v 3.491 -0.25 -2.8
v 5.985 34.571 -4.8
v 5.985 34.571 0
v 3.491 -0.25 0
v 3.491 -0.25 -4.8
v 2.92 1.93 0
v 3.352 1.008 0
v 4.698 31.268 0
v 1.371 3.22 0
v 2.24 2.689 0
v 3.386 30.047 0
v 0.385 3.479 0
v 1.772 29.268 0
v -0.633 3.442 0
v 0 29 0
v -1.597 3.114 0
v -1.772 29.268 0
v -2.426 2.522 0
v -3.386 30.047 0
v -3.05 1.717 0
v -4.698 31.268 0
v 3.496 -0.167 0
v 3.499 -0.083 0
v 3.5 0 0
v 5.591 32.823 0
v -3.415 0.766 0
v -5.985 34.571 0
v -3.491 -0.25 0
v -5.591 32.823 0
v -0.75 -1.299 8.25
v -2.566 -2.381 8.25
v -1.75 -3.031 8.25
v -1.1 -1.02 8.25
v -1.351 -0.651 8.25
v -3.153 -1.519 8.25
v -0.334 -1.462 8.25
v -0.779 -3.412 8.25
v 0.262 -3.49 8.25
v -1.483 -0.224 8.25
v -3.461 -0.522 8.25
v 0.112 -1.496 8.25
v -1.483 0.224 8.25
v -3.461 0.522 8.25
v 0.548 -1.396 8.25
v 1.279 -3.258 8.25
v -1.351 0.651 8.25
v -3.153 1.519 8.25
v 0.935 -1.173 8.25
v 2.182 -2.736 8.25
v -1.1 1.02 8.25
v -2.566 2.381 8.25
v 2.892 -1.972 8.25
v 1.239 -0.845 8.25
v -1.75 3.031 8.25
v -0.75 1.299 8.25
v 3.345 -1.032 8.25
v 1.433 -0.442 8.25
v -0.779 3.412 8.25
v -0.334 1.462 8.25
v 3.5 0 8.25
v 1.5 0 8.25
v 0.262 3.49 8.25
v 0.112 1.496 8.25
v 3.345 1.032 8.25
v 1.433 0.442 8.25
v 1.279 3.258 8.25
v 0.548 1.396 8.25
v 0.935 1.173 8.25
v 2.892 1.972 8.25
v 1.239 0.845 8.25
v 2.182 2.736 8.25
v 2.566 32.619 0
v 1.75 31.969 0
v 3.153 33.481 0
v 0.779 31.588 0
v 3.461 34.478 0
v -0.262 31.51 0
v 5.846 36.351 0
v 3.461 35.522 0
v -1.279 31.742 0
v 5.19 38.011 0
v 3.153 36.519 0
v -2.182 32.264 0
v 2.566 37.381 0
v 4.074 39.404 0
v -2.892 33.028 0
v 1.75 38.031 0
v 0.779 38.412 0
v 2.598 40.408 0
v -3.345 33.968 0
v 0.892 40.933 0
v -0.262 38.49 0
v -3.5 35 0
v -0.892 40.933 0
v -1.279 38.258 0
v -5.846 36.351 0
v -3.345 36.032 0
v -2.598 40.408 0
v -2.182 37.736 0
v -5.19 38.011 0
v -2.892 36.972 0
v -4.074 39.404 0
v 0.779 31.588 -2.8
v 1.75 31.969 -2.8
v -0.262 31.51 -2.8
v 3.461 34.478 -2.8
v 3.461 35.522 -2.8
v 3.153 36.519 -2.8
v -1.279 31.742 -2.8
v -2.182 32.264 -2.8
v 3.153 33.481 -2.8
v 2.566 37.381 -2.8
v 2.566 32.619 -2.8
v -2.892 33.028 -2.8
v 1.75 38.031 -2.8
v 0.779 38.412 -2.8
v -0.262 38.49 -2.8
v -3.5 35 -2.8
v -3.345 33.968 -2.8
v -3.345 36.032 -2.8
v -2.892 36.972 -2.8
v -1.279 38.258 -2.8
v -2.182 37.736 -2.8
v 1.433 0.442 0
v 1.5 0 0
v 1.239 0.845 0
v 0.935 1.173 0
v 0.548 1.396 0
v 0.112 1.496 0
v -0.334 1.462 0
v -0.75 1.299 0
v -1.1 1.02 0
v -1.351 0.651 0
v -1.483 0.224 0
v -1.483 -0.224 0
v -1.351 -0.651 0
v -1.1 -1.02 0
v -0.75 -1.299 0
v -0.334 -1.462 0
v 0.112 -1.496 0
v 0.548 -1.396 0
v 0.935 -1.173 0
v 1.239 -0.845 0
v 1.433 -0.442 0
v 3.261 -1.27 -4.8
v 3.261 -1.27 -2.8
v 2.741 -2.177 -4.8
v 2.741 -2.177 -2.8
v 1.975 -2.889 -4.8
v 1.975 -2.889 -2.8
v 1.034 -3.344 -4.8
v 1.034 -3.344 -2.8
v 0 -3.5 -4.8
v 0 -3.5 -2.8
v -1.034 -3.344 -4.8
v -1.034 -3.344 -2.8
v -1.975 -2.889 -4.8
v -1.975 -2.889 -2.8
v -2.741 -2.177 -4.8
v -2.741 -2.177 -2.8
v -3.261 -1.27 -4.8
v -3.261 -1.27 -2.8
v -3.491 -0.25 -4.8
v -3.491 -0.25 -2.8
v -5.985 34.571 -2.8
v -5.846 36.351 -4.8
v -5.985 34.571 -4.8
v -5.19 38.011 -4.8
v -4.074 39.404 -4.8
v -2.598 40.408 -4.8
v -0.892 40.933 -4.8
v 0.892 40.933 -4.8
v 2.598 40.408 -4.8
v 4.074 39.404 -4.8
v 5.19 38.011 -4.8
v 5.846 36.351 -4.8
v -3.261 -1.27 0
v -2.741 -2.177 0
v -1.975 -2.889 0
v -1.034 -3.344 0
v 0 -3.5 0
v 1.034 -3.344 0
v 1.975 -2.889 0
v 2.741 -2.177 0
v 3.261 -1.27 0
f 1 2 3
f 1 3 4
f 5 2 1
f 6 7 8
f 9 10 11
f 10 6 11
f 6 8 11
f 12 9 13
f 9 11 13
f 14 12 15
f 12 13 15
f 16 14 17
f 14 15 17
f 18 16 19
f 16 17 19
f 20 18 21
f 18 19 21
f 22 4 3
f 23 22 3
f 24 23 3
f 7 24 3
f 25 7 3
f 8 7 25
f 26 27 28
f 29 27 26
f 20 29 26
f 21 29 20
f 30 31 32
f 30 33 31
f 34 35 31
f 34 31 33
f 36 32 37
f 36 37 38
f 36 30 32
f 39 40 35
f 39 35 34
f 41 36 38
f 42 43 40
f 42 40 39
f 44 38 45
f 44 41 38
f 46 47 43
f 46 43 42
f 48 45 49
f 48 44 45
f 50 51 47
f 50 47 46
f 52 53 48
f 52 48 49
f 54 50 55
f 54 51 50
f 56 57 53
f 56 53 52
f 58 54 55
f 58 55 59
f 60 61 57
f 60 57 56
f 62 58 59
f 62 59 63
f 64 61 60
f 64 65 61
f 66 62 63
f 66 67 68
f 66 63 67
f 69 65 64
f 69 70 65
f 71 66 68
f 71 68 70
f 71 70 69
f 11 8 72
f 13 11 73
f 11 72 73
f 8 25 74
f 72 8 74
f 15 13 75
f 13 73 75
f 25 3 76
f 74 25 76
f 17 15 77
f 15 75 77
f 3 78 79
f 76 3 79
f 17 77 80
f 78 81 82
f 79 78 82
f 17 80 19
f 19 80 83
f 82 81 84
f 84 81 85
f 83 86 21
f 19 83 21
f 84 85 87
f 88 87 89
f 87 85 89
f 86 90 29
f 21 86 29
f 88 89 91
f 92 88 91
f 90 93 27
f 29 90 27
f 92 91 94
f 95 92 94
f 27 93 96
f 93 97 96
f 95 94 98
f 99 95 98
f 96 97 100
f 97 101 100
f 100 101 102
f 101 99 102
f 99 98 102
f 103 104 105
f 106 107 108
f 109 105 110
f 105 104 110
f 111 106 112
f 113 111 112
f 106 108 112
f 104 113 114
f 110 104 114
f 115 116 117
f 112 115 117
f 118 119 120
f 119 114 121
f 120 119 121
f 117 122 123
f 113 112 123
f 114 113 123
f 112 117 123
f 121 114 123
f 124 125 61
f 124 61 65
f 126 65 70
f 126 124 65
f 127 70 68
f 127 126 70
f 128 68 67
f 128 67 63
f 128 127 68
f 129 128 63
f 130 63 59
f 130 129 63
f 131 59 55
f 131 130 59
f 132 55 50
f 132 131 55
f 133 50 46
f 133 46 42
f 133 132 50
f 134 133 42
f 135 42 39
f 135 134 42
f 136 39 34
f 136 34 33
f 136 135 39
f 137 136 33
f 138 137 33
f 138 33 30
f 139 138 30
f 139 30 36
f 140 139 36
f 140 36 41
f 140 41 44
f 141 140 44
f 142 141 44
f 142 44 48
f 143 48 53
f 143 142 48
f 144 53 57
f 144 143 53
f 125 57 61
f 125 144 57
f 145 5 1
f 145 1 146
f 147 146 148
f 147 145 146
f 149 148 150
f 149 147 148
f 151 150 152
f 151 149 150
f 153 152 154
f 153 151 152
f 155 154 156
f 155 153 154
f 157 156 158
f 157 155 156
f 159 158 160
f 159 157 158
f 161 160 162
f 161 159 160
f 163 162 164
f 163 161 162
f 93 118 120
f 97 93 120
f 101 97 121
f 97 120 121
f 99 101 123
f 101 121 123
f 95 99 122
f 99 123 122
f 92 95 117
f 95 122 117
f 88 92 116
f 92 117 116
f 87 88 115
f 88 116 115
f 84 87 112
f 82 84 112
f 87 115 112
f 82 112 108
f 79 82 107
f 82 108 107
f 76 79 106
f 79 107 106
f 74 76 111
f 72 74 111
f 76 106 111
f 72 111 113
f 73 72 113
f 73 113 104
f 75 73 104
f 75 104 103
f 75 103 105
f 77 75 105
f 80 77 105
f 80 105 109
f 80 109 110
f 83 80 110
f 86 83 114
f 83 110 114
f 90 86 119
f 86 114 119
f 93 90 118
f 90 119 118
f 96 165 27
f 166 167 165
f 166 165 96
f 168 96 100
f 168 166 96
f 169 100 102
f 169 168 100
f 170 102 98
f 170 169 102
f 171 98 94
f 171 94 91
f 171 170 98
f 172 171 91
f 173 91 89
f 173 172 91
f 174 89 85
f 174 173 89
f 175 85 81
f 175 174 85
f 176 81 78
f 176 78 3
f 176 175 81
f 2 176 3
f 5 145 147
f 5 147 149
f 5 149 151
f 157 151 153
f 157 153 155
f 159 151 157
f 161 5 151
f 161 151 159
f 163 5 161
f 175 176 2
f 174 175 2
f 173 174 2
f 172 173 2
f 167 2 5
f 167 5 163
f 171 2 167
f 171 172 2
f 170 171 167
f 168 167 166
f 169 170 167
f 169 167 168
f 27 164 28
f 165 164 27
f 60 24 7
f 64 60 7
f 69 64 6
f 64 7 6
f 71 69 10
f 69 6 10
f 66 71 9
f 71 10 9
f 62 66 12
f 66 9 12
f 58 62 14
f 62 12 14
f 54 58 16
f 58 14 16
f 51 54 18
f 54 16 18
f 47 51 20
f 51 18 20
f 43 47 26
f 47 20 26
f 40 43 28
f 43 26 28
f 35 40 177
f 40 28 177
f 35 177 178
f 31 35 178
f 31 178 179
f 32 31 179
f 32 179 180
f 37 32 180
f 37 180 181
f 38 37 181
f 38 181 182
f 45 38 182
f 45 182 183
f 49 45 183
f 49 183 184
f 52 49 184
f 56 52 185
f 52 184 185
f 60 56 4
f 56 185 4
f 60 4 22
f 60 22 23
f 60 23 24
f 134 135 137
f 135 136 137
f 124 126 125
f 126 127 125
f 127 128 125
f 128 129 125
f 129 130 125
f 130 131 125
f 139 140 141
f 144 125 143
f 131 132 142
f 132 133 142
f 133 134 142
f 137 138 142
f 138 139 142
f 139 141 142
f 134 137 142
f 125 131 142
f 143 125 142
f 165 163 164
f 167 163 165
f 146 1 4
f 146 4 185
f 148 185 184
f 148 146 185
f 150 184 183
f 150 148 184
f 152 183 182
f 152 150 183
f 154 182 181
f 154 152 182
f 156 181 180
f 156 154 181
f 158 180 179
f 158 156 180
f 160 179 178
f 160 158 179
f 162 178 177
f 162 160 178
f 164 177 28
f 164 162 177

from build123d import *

# Parameters (mm, degrees)
SKETCH1_R           = 3.5
SKETCH1_R_2         = 1.5
BOSS_EXTRUDE1_DEPTH = 8.25
BOSS_EXTRUDE2_START = 2.8
SKETCH2_R           = 6
SKETCH2_R_2         = 3.5
SKETCH2_R_3         = 1.5
BOSS_EXTRUDE2_DEPTH = 2.8
BOSS_EXTRUDE3_START = 4.8
SKETCH2_3_R         = 6
SKETCH2_3_R_2       = 3.5
SKETCH2_3_R_3       = 1.5
BOSS_EXTRUDE3_DEPTH = 2


with BuildPart() as part:
    # Sketch1 → Boss-Extrude1 (new body)
    with BuildSketch(Plane.XY):
        Circle(SKETCH1_R)
        Circle(SKETCH1_R_2, mode=Mode.SUBTRACT)
    extrude(amount=BOSS_EXTRUDE1_DEPTH)

    # Sketch2 → Boss-Extrude2 (add)
    # profile 1 of 4: a face of its own
    with BuildSketch(Plane(origin=(0, 0, 0), x_dir=(-1, 0, 0), z_dir=(0, 0, -1)).offset(BOSS_EXTRUDE2_START)):
        with BuildLine():
            ThreePointArc((5.984674304, 34.571428571), (0, 29), (-5.984674304, 34.571428571))
            Line((-5.984674304, 34.571428571), (-3.491060011, -0.25))
            ThreePointArc((-3.491060011, -0.25), (-0.125079898, 3.497764289), (3.5, 0))
            ThreePointArc((3.5, 0), (3.497764289, -0.125079898), (3.491060011, -0.25))
            Line((3.491060011, -0.25), (5.984674304, 34.571428571))
        make_face()
    # profile 2 of 4: a face of its own
    with BuildSketch(Plane(origin=(0, 0, 0), x_dir=(-1, 0, 0), z_dir=(0, 0, -1)).offset(BOSS_EXTRUDE2_START)):
        with Locations((0, 35)):
            Circle(SKETCH2_R)
        with Locations((0, 35)):
            Circle(SKETCH2_R_2, mode=Mode.SUBTRACT)
    # profile 3 of 4: a face of its own
    with BuildSketch(Plane(origin=(0, 0, 0), x_dir=(-1, 0, 0), z_dir=(0, 0, -1)).offset(BOSS_EXTRUDE2_START)):
        with Locations(Location((0, 0, 0), (0, 0, 355.903956242))):
            Circle(SKETCH2_R_2)
        with Locations(Location((0, 0, 0), (0, 0, 180))):
            Circle(SKETCH2_R_3, mode=Mode.SUBTRACT)
    # profile 4 of 4: a face of its own
    with BuildSketch(Plane(origin=(0, 0, 0), x_dir=(-1, 0, 0), z_dir=(0, 0, -1)).offset(BOSS_EXTRUDE2_START)):
        with Locations(Location((0, 0, 0), (0, 0, 180))):
            Circle(SKETCH2_R_3)
    extrude(amount=-BOSS_EXTRUDE2_DEPTH)

    # Sketch2<3> → Boss-Extrude3 (add)
    # profile 1 of 5: a face of its own
    with BuildSketch(Plane(origin=(0, 0, 0), x_dir=(-1, 0, 0), z_dir=(0, 0, -1)).offset(BOSS_EXTRUDE3_START)):
        with Locations((0, 35)):
            Circle(SKETCH2_3_R)
        with Locations((0, 35)):
            Circle(SKETCH2_3_R_2, mode=Mode.SUBTRACT)
    # profile 2 of 5: a face of its own
    with BuildSketch(Plane(origin=(0, 0, 0), x_dir=(-1, 0, 0), z_dir=(0, 0, -1)).offset(BOSS_EXTRUDE3_START)):
        with BuildLine():
            ThreePointArc((5.984674304, 34.571428571), (0, 29), (-5.984674304, 34.571428571))
            Line((-5.984674304, 34.571428571), (-3.491060011, -0.25))
            ThreePointArc((-3.491060011, -0.25), (-0.125079898, 3.497764289), (3.5, 0))
            ThreePointArc((3.5, 0), (3.497764289, -0.125079898), (3.491060011, -0.25))
            Line((3.491060011, -0.25), (5.984674304, 34.571428571))
        make_face()
    # profile 3 of 5: a face of its own
    with BuildSketch(Plane(origin=(0, 0, 0), x_dir=(-1, 0, 0), z_dir=(0, 0, -1)).offset(BOSS_EXTRUDE3_START)):
        with Locations(Location((0, 0, 0), (0, 0, 355.903956242))):
            Circle(SKETCH2_3_R_2)
        with Locations(Location((0, 0, 0), (0, 0, 180))):
            Circle(SKETCH2_3_R_3, mode=Mode.SUBTRACT)
    # profile 4 of 5: a face of its own
    with BuildSketch(Plane(origin=(0, 0, 0), x_dir=(-1, 0, 0), z_dir=(0, 0, -1)).offset(BOSS_EXTRUDE3_START)):
        with Locations((0, 35)):
            Circle(SKETCH2_3_R_2)
    # profile 5 of 5: a face of its own
    with BuildSketch(Plane(origin=(0, 0, 0), x_dir=(-1, 0, 0), z_dir=(0, 0, -1)).offset(BOSS_EXTRUDE3_START)):
        with Locations(Location((0, 0, 0), (0, 0, 180))):
            Circle(SKETCH2_3_R_3)
    extrude(amount=-BOSS_EXTRUDE3_DEPTH)


solid = part.part
